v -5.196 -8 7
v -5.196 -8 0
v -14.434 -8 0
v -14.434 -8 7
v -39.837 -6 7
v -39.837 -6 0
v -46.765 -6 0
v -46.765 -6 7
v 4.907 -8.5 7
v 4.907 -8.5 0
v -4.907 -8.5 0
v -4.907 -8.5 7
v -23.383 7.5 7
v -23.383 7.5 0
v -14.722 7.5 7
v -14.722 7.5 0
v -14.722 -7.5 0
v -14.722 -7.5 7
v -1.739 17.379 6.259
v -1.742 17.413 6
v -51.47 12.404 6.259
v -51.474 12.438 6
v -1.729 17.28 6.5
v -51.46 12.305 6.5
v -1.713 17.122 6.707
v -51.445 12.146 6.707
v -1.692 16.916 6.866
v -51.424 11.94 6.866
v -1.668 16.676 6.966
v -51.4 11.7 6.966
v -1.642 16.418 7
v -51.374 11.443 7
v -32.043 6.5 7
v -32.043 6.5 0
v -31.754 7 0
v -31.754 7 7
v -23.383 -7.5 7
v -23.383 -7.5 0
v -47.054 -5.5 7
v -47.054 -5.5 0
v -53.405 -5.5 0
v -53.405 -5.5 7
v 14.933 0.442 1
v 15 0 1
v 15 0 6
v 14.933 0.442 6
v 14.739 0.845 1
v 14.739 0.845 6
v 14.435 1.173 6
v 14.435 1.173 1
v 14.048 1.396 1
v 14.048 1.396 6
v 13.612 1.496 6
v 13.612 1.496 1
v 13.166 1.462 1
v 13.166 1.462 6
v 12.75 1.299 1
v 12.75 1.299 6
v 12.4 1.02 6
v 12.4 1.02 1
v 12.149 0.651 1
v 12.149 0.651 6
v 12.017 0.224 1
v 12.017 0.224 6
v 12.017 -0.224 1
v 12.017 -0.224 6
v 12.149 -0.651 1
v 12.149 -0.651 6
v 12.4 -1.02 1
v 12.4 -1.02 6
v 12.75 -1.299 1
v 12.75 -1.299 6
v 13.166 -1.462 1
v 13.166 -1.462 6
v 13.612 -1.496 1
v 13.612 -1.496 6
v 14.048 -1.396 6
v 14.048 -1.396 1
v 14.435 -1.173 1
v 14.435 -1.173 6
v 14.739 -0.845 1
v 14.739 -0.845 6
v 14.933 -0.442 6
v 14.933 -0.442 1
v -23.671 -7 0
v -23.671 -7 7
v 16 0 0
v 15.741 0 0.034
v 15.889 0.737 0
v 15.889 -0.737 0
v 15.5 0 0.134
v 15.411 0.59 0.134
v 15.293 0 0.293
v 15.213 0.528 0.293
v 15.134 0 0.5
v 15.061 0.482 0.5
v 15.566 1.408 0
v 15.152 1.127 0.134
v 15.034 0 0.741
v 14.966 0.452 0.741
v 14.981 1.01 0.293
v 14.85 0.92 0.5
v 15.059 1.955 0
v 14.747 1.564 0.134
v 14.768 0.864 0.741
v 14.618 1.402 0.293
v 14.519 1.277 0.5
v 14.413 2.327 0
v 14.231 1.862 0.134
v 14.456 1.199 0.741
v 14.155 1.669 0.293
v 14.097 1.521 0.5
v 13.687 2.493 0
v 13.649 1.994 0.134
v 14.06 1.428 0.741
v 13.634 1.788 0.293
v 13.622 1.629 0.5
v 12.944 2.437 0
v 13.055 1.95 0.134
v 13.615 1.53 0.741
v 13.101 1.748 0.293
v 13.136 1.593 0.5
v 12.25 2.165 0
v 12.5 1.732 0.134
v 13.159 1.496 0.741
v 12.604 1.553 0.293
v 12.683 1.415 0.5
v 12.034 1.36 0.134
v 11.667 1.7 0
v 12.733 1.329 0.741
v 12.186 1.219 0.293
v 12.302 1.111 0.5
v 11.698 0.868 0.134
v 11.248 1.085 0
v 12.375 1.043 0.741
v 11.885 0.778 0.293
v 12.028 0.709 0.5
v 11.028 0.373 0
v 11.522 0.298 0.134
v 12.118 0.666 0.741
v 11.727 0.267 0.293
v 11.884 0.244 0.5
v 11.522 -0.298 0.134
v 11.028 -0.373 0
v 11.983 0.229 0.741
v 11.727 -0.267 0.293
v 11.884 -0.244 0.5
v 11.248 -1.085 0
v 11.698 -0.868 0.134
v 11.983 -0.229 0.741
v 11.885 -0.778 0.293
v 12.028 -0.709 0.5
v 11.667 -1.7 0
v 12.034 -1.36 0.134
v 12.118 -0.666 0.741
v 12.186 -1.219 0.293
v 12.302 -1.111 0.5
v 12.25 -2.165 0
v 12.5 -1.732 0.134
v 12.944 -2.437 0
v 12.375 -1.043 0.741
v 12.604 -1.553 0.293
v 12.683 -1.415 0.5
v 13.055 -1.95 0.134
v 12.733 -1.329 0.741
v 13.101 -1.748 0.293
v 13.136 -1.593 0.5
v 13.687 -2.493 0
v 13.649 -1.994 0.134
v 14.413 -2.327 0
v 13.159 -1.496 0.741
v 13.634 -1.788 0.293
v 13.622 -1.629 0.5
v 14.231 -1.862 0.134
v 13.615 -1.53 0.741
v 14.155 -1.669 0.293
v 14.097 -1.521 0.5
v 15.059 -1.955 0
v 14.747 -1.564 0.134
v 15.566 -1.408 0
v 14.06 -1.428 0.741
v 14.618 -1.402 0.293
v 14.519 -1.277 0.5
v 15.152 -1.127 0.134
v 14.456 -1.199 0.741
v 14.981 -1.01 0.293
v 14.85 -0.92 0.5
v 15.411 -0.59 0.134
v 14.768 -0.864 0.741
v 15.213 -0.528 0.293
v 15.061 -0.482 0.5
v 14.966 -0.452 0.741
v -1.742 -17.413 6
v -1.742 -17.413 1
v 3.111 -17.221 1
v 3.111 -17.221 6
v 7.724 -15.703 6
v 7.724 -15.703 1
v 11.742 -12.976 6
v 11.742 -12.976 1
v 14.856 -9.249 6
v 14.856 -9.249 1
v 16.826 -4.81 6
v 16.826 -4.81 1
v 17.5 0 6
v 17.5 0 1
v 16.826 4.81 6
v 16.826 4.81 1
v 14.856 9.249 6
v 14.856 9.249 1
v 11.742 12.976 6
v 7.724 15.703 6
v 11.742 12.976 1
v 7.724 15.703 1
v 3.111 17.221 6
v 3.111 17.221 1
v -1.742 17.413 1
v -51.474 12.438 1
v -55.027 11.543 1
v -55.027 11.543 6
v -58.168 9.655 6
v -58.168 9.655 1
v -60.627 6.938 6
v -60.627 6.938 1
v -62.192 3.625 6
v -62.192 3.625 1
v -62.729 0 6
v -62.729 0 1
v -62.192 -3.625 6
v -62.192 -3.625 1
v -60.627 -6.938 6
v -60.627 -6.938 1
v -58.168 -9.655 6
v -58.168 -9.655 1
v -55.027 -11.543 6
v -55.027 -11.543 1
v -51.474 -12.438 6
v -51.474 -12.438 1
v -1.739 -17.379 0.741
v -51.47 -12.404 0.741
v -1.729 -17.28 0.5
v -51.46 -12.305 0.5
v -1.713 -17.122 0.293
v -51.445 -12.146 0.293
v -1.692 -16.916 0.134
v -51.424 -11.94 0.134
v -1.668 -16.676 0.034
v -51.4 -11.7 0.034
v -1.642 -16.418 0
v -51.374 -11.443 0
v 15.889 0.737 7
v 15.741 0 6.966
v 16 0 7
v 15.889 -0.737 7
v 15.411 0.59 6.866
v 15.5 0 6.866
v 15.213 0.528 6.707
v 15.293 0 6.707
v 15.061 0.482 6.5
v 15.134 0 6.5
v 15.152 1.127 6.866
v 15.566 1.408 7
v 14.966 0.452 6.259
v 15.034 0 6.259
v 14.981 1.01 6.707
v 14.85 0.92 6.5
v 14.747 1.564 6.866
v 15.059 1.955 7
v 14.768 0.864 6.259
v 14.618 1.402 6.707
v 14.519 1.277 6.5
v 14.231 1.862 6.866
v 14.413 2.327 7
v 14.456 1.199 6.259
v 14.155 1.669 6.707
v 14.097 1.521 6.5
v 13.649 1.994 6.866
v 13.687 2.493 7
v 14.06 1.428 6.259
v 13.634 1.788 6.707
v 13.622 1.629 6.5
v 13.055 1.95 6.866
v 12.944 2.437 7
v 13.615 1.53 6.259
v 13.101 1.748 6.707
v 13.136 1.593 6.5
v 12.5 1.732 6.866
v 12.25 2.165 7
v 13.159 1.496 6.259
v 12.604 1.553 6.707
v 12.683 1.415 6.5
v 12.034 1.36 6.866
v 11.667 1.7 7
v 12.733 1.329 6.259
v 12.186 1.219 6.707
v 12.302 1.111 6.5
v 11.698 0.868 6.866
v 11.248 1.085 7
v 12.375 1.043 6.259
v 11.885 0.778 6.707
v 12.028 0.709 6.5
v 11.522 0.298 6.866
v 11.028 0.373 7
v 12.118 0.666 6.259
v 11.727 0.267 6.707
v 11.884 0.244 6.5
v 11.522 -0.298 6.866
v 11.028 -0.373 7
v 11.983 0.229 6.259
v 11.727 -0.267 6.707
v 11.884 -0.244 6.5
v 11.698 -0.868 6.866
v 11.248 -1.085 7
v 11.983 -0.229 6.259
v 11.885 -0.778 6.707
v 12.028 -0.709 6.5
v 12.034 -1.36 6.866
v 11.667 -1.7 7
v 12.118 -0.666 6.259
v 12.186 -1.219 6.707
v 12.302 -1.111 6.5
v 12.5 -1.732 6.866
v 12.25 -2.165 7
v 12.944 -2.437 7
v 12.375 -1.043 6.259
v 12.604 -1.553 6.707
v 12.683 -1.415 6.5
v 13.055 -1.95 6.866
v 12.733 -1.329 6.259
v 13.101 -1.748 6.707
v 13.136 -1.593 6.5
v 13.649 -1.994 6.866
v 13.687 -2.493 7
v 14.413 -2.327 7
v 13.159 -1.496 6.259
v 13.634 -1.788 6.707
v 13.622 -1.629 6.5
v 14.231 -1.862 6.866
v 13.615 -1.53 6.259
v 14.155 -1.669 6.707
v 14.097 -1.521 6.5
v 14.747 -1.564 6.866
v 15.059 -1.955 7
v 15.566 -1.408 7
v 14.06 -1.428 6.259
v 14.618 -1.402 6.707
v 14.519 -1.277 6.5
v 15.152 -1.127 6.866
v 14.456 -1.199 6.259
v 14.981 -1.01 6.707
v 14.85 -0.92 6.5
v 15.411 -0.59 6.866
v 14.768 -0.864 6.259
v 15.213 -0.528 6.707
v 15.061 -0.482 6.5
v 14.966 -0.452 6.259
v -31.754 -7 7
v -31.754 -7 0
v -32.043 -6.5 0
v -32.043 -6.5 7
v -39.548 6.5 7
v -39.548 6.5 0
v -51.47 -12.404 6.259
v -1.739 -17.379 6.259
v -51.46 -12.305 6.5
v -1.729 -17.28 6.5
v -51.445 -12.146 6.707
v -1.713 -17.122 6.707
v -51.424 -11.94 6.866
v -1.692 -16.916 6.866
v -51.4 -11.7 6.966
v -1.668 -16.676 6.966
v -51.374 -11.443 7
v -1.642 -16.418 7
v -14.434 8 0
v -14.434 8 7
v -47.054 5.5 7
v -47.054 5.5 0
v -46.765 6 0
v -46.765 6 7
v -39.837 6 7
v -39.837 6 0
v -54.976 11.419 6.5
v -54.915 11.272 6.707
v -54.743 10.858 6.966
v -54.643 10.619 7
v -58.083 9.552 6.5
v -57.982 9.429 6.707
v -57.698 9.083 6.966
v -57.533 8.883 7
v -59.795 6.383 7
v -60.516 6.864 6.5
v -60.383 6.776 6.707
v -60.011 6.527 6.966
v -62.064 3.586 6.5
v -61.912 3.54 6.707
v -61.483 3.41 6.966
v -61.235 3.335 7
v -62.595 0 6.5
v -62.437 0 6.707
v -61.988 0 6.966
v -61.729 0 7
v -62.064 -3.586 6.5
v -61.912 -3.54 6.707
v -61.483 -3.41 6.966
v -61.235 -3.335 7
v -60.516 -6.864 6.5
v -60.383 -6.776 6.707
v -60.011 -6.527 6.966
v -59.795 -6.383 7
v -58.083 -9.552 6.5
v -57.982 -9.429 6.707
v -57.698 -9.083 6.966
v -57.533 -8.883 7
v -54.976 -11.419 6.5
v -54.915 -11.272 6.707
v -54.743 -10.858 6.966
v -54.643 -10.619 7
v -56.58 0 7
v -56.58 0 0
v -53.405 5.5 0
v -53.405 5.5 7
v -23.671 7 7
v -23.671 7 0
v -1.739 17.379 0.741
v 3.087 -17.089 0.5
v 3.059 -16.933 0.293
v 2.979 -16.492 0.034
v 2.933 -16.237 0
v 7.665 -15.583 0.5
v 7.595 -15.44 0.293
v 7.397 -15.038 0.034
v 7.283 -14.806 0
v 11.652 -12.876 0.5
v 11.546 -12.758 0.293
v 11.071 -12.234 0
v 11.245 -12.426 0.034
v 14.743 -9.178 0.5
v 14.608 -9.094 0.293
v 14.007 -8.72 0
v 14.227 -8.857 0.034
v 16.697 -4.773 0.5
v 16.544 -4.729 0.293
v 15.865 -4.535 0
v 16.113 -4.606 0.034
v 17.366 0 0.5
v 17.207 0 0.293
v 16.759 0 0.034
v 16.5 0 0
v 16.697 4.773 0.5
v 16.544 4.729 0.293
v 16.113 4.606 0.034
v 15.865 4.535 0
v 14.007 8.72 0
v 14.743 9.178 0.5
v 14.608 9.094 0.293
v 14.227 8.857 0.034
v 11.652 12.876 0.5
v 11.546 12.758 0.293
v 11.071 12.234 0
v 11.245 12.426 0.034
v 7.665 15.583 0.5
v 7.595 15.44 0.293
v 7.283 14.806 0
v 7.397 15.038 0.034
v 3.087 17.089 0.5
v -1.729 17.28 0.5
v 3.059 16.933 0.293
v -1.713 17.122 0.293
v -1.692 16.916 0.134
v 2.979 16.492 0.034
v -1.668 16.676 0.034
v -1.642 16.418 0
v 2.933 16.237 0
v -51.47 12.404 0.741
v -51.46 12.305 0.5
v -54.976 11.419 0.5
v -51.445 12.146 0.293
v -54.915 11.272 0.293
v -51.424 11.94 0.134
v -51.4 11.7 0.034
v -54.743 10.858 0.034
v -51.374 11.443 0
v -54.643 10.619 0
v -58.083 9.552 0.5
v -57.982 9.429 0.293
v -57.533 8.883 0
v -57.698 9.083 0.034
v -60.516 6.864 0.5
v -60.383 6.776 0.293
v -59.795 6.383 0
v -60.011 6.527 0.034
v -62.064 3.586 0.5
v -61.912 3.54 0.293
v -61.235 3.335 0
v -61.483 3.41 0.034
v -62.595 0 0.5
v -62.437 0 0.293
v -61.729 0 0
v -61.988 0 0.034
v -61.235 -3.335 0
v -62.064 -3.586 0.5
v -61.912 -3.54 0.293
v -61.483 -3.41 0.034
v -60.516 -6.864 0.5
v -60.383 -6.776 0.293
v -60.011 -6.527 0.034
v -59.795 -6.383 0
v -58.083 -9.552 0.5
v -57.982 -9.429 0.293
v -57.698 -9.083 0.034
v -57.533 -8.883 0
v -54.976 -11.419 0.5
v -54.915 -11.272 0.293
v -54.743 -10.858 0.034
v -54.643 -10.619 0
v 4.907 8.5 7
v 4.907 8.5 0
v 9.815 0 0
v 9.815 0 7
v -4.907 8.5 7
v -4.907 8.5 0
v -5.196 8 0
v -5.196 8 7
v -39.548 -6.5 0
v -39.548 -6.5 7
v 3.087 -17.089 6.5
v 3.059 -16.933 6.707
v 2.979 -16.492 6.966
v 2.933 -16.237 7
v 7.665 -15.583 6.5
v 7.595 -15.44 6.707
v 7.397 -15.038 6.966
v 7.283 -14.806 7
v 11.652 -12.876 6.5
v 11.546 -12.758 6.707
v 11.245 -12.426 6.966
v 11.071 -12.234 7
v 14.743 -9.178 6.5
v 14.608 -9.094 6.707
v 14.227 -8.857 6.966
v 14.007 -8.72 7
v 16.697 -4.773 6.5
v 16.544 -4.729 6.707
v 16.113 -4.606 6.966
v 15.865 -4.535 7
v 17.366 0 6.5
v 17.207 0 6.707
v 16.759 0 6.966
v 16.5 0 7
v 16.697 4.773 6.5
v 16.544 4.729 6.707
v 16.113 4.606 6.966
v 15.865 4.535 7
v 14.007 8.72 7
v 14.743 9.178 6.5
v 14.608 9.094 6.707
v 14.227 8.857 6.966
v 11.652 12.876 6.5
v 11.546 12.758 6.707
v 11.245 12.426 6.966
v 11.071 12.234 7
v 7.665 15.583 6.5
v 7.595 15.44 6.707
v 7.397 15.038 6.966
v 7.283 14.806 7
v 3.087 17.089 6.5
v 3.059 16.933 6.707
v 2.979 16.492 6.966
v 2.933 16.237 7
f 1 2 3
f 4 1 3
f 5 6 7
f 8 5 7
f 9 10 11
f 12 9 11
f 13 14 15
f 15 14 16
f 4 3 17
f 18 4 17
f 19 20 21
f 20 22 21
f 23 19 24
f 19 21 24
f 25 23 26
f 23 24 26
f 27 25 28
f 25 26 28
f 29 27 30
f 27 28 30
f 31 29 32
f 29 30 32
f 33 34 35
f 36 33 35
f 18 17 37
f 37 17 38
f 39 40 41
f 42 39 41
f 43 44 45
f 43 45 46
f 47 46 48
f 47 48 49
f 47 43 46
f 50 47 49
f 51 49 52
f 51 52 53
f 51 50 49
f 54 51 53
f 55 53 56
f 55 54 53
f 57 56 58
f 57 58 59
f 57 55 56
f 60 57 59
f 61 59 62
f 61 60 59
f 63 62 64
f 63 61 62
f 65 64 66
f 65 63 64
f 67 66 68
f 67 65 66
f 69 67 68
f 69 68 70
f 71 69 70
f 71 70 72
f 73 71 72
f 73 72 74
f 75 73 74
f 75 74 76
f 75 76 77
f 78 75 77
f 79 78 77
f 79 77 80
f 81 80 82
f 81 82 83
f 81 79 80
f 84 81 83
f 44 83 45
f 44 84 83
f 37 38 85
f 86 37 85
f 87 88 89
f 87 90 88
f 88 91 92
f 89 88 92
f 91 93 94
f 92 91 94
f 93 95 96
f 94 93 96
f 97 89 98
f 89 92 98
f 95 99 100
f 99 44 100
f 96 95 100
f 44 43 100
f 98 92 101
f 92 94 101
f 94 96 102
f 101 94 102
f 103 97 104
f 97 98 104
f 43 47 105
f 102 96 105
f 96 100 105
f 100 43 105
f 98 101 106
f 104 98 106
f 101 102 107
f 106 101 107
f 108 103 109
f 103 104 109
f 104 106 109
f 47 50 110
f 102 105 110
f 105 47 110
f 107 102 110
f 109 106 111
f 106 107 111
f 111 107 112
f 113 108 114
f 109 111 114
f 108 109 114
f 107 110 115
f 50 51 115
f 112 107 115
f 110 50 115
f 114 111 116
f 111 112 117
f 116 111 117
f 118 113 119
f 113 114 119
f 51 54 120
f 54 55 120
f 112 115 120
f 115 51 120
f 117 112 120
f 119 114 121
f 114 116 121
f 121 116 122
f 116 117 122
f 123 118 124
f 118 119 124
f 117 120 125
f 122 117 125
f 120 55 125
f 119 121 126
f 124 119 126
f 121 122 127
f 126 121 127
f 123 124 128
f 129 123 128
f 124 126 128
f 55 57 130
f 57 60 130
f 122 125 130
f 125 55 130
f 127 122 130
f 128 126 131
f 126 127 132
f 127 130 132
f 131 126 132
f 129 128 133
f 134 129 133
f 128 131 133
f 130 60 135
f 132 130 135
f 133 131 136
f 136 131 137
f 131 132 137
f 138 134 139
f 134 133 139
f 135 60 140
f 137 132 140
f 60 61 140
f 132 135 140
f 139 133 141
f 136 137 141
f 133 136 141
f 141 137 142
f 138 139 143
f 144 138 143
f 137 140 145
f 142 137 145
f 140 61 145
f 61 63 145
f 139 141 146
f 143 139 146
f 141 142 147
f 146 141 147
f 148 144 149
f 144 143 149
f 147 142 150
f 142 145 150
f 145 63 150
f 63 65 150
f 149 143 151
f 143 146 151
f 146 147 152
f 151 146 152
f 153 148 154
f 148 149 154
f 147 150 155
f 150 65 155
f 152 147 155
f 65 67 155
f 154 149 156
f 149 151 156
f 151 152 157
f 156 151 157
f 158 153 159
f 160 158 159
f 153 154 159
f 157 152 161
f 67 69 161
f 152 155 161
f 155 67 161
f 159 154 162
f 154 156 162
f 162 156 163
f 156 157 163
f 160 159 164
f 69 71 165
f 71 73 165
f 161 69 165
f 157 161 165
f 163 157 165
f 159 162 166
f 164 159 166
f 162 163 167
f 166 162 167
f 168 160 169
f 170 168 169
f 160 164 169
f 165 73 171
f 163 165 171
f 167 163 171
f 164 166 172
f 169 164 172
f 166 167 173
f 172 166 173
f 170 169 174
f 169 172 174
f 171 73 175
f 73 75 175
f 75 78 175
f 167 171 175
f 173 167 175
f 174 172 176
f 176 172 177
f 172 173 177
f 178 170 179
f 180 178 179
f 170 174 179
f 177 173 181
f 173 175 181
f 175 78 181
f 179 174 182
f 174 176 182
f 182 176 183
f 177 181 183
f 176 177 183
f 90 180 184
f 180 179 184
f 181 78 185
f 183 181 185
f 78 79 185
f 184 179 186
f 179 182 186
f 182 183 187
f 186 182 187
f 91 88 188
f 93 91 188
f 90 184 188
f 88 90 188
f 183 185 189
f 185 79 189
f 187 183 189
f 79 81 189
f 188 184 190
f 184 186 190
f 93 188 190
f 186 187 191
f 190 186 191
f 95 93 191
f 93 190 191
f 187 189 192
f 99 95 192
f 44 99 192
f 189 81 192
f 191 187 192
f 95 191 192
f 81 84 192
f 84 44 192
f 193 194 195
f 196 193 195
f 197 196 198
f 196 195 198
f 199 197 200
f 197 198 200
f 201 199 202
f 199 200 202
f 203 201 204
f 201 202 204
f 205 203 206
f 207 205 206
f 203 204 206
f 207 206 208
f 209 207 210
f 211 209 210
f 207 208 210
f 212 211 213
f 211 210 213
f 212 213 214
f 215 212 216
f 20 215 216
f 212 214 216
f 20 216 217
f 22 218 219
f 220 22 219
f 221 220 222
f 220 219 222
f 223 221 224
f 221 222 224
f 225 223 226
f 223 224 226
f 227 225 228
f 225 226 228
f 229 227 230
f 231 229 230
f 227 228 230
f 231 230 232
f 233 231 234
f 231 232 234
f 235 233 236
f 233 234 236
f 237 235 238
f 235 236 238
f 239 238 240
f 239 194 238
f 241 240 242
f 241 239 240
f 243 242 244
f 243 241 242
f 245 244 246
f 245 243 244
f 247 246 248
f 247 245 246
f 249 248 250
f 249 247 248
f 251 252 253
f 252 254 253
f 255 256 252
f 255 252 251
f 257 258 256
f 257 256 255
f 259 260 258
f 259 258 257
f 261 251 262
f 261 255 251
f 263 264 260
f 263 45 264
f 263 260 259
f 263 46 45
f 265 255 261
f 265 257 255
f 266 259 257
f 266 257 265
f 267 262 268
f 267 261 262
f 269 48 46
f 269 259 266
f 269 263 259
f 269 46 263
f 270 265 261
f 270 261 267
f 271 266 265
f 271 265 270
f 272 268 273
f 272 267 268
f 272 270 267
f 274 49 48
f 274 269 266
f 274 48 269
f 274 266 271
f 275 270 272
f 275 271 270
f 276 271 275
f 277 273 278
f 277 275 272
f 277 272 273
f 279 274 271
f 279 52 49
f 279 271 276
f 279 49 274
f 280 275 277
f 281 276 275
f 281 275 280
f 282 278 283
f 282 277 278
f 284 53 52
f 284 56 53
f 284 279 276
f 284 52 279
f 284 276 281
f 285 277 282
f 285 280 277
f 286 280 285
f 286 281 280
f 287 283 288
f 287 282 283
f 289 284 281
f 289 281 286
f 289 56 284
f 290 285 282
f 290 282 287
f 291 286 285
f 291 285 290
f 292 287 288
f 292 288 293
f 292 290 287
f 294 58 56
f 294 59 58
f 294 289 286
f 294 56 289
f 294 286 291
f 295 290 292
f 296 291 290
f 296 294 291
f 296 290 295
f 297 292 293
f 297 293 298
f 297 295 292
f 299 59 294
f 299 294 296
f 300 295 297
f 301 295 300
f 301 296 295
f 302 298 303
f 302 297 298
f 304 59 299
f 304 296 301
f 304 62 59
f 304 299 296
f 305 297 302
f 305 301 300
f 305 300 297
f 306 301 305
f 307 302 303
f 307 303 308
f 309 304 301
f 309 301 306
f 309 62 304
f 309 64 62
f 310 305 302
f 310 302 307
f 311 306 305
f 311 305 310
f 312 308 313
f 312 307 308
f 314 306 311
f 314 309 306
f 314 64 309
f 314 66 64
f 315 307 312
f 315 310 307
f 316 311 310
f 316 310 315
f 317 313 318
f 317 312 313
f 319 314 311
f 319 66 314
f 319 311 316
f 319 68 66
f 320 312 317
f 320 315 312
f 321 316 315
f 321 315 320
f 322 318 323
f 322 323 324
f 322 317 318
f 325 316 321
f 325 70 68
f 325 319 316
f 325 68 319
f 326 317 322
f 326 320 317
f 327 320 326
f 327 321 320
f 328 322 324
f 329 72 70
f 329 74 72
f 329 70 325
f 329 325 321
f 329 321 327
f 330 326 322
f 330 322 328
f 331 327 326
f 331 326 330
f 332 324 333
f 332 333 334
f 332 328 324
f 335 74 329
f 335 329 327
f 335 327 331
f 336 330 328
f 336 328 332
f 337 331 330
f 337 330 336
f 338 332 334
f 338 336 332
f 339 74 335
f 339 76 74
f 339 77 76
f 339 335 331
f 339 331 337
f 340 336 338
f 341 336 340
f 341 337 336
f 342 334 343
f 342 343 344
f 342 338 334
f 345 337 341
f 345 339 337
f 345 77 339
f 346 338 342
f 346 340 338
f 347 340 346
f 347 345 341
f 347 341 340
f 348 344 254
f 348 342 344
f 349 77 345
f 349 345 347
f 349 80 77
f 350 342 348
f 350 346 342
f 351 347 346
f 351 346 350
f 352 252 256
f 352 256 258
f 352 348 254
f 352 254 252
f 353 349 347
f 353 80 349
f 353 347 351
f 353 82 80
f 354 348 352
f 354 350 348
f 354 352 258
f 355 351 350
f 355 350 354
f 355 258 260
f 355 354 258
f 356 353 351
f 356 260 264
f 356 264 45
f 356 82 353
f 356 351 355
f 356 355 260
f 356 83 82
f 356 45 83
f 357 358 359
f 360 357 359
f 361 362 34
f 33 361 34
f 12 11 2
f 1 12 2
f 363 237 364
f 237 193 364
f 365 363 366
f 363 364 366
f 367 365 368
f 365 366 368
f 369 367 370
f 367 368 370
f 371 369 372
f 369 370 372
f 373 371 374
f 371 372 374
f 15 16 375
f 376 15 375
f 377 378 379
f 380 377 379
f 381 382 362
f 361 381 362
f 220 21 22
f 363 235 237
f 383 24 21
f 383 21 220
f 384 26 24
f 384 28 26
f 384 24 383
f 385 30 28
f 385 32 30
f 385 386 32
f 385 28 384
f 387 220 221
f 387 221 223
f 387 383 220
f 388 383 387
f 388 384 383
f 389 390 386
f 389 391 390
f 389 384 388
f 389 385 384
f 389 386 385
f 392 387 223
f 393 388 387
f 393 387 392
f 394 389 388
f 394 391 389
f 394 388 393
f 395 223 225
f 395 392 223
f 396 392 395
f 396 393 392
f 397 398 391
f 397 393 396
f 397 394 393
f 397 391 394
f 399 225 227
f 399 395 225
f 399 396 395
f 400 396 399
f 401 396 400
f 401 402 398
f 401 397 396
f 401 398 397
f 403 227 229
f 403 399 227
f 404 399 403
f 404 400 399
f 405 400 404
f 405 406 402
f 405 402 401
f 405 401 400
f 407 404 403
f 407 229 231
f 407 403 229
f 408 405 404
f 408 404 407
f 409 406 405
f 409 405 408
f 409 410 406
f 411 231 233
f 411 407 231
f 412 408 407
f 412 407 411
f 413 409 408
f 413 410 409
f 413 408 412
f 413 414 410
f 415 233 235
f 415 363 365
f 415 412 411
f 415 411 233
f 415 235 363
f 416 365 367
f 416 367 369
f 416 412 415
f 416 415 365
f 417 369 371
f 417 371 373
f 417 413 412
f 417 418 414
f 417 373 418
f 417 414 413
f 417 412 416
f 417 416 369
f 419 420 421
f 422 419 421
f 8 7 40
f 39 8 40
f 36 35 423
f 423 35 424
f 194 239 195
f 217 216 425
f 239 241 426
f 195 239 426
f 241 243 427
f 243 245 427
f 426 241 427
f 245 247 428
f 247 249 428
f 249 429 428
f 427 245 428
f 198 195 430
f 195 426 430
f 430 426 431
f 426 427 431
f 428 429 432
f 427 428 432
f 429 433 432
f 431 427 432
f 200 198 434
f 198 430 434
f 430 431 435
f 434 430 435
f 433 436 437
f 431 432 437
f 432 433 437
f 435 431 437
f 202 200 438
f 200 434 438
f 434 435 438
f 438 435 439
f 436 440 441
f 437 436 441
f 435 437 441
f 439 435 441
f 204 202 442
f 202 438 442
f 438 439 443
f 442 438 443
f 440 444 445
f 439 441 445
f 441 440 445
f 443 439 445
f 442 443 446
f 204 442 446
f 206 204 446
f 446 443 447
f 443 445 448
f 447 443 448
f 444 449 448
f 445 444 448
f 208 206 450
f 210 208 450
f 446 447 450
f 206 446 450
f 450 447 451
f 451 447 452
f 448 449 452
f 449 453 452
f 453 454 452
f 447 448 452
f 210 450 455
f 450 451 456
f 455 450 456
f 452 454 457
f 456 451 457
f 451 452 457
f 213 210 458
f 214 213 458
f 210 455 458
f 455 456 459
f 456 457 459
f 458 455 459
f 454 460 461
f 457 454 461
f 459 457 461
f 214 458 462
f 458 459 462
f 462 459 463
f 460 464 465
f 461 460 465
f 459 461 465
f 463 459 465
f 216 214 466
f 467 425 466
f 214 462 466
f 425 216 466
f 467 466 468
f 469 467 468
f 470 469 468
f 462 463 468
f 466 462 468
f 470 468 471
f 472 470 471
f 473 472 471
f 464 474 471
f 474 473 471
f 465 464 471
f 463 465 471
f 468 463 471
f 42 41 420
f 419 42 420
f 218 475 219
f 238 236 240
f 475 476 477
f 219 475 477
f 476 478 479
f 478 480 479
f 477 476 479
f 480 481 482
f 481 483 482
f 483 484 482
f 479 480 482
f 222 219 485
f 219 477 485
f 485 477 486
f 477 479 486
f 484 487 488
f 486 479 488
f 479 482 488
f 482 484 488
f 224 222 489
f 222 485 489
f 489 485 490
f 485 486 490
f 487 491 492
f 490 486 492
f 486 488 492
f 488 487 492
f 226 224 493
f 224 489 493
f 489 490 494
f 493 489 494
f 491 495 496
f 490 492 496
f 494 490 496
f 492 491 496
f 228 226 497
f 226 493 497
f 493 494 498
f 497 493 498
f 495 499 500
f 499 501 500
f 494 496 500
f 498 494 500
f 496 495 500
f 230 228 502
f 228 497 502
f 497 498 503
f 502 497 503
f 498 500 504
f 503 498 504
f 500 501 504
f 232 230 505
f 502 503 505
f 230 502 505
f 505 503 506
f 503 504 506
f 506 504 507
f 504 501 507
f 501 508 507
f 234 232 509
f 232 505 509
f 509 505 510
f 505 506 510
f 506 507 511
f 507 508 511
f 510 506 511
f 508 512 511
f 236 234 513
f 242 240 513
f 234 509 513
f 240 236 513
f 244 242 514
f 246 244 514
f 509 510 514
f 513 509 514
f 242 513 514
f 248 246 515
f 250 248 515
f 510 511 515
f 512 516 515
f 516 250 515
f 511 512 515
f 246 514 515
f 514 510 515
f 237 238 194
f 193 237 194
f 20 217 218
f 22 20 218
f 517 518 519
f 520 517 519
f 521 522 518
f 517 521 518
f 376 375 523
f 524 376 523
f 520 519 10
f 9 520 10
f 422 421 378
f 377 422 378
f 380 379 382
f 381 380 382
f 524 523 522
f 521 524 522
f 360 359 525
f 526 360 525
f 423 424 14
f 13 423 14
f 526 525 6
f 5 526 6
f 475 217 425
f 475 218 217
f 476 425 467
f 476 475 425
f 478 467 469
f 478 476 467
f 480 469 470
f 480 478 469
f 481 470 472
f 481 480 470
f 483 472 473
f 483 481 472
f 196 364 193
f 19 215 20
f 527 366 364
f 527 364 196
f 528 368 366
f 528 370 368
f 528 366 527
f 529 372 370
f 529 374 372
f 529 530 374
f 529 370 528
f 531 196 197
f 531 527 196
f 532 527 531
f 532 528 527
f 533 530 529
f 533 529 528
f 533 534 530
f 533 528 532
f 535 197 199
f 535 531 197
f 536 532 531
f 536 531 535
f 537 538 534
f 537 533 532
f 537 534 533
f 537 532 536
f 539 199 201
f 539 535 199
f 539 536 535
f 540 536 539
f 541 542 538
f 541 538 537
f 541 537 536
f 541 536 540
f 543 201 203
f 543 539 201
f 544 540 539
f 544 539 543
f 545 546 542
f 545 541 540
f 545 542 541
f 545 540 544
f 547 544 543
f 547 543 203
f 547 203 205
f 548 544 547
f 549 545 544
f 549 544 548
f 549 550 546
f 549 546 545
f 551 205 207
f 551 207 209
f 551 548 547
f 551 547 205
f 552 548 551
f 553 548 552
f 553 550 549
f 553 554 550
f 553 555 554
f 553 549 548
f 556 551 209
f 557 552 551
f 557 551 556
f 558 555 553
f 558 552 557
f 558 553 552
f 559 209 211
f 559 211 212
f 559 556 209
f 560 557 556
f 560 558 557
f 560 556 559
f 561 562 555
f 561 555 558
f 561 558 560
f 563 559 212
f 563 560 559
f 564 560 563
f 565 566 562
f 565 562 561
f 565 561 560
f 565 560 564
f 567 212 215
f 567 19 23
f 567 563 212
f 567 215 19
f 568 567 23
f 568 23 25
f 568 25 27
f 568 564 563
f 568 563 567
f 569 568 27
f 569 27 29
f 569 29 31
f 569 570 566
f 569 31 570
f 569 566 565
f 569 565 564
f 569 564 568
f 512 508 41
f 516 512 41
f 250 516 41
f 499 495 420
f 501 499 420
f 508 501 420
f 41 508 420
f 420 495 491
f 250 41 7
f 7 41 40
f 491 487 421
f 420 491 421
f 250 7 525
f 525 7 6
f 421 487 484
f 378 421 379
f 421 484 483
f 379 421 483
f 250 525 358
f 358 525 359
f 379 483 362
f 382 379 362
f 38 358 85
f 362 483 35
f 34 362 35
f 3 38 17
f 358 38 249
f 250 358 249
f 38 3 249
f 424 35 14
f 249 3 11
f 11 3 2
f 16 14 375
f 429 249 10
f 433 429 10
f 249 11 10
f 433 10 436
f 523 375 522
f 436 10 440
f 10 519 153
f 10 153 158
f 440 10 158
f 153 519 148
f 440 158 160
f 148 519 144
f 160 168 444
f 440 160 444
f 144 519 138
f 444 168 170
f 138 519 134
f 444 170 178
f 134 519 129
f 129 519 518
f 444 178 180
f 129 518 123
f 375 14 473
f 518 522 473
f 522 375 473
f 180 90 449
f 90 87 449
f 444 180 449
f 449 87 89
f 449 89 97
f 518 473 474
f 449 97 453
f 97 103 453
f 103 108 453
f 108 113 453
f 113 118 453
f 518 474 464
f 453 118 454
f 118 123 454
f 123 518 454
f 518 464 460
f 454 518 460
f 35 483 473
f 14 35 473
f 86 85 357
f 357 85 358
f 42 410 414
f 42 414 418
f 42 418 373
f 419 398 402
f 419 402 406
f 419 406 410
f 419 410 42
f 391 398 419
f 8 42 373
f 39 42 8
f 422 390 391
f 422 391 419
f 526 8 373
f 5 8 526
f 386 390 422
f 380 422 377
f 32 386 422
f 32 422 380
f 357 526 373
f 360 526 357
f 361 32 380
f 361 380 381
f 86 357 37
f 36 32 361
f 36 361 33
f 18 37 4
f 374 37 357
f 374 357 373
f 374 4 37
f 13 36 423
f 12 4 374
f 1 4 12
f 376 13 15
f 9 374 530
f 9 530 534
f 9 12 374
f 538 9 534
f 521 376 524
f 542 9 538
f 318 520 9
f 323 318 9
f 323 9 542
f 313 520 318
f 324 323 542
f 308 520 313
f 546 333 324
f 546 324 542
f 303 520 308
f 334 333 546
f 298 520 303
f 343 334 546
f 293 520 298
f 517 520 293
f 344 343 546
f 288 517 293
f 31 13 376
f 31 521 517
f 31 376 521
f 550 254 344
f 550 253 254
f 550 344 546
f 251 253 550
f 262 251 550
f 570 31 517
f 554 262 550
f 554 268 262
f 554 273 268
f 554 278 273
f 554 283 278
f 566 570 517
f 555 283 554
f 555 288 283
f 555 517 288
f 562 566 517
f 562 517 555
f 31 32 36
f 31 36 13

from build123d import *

# Parameters (mm, degrees)
F0_R     = 1.5
F1_DEPTH = 7
F2_R     = 1
F3_R     = 1


with BuildPart() as f1:
    # F0 (on Top) → F1 (new body)
    with BuildSketch(Plane.XY):
        with BuildLine():
            Line((-51.473763, -12.437916), (-1.742005, -17.413082))
            ThreePointArc((-1.742005, -17.413082), (17.5, 0), (-1.742005, 17.413082))
            Line((-1.742005, 17.413082), (-51.473763, 12.437916))
            ThreePointArc((-51.473763, 12.437916), (-62.729473, 0), (-51.473763, -12.437916))
        make_face()
        Polygon((4.907477, 8.5), (9.814955, 0), (4.907477, -8.5), (-4.907477, -8.5), (-5.196152, -8), (-14.433757, -8), (-14.722432, -7.5), (-23.382686, -7.5), (-23.671361, -7), (-31.754265, -7), (-32.04294, -6.5), (-39.548493, -6.5), (-39.837169, -6), (-46.765372, -6), (-47.054047, -5.5), (-53.4049, -5.5), (-56.580326, 0), (-53.4049, 5.5), (-47.054047, 5.5), (-46.765372, 6), (-39.837169, 6), (-39.548493, 6.5), (-32.04294, 6.5), (-31.754265, 7), (-23.671361, 7), (-23.382686, 7.5), (-14.722432, 7.5), (-14.433757, 8), (-5.196152, 8), (-4.907477, 8.5), align=None, mode=Mode.SUBTRACT)
        with Locations((13.5, 0)):
            Circle(F0_R, mode=Mode.SUBTRACT)
    extrude(amount=F1_DEPTH)

    # F2
    f2_edges = [f1.edges().sort_by_distance(p)[0] for p in [
        (-62.729473, 0, 7),
        (-26.607884, -14.925499, 0),
    ]]
    fillet(f2_edges, radius=F2_R)

    # F3
    f3_edges = [f1.edges().sort_by_distance(p)[0] for p in [
        (12, 0, 7),
        (12, 0, 0),
    ]]
    fillet(f3_edges, radius=F3_R)


solid = f1.part
